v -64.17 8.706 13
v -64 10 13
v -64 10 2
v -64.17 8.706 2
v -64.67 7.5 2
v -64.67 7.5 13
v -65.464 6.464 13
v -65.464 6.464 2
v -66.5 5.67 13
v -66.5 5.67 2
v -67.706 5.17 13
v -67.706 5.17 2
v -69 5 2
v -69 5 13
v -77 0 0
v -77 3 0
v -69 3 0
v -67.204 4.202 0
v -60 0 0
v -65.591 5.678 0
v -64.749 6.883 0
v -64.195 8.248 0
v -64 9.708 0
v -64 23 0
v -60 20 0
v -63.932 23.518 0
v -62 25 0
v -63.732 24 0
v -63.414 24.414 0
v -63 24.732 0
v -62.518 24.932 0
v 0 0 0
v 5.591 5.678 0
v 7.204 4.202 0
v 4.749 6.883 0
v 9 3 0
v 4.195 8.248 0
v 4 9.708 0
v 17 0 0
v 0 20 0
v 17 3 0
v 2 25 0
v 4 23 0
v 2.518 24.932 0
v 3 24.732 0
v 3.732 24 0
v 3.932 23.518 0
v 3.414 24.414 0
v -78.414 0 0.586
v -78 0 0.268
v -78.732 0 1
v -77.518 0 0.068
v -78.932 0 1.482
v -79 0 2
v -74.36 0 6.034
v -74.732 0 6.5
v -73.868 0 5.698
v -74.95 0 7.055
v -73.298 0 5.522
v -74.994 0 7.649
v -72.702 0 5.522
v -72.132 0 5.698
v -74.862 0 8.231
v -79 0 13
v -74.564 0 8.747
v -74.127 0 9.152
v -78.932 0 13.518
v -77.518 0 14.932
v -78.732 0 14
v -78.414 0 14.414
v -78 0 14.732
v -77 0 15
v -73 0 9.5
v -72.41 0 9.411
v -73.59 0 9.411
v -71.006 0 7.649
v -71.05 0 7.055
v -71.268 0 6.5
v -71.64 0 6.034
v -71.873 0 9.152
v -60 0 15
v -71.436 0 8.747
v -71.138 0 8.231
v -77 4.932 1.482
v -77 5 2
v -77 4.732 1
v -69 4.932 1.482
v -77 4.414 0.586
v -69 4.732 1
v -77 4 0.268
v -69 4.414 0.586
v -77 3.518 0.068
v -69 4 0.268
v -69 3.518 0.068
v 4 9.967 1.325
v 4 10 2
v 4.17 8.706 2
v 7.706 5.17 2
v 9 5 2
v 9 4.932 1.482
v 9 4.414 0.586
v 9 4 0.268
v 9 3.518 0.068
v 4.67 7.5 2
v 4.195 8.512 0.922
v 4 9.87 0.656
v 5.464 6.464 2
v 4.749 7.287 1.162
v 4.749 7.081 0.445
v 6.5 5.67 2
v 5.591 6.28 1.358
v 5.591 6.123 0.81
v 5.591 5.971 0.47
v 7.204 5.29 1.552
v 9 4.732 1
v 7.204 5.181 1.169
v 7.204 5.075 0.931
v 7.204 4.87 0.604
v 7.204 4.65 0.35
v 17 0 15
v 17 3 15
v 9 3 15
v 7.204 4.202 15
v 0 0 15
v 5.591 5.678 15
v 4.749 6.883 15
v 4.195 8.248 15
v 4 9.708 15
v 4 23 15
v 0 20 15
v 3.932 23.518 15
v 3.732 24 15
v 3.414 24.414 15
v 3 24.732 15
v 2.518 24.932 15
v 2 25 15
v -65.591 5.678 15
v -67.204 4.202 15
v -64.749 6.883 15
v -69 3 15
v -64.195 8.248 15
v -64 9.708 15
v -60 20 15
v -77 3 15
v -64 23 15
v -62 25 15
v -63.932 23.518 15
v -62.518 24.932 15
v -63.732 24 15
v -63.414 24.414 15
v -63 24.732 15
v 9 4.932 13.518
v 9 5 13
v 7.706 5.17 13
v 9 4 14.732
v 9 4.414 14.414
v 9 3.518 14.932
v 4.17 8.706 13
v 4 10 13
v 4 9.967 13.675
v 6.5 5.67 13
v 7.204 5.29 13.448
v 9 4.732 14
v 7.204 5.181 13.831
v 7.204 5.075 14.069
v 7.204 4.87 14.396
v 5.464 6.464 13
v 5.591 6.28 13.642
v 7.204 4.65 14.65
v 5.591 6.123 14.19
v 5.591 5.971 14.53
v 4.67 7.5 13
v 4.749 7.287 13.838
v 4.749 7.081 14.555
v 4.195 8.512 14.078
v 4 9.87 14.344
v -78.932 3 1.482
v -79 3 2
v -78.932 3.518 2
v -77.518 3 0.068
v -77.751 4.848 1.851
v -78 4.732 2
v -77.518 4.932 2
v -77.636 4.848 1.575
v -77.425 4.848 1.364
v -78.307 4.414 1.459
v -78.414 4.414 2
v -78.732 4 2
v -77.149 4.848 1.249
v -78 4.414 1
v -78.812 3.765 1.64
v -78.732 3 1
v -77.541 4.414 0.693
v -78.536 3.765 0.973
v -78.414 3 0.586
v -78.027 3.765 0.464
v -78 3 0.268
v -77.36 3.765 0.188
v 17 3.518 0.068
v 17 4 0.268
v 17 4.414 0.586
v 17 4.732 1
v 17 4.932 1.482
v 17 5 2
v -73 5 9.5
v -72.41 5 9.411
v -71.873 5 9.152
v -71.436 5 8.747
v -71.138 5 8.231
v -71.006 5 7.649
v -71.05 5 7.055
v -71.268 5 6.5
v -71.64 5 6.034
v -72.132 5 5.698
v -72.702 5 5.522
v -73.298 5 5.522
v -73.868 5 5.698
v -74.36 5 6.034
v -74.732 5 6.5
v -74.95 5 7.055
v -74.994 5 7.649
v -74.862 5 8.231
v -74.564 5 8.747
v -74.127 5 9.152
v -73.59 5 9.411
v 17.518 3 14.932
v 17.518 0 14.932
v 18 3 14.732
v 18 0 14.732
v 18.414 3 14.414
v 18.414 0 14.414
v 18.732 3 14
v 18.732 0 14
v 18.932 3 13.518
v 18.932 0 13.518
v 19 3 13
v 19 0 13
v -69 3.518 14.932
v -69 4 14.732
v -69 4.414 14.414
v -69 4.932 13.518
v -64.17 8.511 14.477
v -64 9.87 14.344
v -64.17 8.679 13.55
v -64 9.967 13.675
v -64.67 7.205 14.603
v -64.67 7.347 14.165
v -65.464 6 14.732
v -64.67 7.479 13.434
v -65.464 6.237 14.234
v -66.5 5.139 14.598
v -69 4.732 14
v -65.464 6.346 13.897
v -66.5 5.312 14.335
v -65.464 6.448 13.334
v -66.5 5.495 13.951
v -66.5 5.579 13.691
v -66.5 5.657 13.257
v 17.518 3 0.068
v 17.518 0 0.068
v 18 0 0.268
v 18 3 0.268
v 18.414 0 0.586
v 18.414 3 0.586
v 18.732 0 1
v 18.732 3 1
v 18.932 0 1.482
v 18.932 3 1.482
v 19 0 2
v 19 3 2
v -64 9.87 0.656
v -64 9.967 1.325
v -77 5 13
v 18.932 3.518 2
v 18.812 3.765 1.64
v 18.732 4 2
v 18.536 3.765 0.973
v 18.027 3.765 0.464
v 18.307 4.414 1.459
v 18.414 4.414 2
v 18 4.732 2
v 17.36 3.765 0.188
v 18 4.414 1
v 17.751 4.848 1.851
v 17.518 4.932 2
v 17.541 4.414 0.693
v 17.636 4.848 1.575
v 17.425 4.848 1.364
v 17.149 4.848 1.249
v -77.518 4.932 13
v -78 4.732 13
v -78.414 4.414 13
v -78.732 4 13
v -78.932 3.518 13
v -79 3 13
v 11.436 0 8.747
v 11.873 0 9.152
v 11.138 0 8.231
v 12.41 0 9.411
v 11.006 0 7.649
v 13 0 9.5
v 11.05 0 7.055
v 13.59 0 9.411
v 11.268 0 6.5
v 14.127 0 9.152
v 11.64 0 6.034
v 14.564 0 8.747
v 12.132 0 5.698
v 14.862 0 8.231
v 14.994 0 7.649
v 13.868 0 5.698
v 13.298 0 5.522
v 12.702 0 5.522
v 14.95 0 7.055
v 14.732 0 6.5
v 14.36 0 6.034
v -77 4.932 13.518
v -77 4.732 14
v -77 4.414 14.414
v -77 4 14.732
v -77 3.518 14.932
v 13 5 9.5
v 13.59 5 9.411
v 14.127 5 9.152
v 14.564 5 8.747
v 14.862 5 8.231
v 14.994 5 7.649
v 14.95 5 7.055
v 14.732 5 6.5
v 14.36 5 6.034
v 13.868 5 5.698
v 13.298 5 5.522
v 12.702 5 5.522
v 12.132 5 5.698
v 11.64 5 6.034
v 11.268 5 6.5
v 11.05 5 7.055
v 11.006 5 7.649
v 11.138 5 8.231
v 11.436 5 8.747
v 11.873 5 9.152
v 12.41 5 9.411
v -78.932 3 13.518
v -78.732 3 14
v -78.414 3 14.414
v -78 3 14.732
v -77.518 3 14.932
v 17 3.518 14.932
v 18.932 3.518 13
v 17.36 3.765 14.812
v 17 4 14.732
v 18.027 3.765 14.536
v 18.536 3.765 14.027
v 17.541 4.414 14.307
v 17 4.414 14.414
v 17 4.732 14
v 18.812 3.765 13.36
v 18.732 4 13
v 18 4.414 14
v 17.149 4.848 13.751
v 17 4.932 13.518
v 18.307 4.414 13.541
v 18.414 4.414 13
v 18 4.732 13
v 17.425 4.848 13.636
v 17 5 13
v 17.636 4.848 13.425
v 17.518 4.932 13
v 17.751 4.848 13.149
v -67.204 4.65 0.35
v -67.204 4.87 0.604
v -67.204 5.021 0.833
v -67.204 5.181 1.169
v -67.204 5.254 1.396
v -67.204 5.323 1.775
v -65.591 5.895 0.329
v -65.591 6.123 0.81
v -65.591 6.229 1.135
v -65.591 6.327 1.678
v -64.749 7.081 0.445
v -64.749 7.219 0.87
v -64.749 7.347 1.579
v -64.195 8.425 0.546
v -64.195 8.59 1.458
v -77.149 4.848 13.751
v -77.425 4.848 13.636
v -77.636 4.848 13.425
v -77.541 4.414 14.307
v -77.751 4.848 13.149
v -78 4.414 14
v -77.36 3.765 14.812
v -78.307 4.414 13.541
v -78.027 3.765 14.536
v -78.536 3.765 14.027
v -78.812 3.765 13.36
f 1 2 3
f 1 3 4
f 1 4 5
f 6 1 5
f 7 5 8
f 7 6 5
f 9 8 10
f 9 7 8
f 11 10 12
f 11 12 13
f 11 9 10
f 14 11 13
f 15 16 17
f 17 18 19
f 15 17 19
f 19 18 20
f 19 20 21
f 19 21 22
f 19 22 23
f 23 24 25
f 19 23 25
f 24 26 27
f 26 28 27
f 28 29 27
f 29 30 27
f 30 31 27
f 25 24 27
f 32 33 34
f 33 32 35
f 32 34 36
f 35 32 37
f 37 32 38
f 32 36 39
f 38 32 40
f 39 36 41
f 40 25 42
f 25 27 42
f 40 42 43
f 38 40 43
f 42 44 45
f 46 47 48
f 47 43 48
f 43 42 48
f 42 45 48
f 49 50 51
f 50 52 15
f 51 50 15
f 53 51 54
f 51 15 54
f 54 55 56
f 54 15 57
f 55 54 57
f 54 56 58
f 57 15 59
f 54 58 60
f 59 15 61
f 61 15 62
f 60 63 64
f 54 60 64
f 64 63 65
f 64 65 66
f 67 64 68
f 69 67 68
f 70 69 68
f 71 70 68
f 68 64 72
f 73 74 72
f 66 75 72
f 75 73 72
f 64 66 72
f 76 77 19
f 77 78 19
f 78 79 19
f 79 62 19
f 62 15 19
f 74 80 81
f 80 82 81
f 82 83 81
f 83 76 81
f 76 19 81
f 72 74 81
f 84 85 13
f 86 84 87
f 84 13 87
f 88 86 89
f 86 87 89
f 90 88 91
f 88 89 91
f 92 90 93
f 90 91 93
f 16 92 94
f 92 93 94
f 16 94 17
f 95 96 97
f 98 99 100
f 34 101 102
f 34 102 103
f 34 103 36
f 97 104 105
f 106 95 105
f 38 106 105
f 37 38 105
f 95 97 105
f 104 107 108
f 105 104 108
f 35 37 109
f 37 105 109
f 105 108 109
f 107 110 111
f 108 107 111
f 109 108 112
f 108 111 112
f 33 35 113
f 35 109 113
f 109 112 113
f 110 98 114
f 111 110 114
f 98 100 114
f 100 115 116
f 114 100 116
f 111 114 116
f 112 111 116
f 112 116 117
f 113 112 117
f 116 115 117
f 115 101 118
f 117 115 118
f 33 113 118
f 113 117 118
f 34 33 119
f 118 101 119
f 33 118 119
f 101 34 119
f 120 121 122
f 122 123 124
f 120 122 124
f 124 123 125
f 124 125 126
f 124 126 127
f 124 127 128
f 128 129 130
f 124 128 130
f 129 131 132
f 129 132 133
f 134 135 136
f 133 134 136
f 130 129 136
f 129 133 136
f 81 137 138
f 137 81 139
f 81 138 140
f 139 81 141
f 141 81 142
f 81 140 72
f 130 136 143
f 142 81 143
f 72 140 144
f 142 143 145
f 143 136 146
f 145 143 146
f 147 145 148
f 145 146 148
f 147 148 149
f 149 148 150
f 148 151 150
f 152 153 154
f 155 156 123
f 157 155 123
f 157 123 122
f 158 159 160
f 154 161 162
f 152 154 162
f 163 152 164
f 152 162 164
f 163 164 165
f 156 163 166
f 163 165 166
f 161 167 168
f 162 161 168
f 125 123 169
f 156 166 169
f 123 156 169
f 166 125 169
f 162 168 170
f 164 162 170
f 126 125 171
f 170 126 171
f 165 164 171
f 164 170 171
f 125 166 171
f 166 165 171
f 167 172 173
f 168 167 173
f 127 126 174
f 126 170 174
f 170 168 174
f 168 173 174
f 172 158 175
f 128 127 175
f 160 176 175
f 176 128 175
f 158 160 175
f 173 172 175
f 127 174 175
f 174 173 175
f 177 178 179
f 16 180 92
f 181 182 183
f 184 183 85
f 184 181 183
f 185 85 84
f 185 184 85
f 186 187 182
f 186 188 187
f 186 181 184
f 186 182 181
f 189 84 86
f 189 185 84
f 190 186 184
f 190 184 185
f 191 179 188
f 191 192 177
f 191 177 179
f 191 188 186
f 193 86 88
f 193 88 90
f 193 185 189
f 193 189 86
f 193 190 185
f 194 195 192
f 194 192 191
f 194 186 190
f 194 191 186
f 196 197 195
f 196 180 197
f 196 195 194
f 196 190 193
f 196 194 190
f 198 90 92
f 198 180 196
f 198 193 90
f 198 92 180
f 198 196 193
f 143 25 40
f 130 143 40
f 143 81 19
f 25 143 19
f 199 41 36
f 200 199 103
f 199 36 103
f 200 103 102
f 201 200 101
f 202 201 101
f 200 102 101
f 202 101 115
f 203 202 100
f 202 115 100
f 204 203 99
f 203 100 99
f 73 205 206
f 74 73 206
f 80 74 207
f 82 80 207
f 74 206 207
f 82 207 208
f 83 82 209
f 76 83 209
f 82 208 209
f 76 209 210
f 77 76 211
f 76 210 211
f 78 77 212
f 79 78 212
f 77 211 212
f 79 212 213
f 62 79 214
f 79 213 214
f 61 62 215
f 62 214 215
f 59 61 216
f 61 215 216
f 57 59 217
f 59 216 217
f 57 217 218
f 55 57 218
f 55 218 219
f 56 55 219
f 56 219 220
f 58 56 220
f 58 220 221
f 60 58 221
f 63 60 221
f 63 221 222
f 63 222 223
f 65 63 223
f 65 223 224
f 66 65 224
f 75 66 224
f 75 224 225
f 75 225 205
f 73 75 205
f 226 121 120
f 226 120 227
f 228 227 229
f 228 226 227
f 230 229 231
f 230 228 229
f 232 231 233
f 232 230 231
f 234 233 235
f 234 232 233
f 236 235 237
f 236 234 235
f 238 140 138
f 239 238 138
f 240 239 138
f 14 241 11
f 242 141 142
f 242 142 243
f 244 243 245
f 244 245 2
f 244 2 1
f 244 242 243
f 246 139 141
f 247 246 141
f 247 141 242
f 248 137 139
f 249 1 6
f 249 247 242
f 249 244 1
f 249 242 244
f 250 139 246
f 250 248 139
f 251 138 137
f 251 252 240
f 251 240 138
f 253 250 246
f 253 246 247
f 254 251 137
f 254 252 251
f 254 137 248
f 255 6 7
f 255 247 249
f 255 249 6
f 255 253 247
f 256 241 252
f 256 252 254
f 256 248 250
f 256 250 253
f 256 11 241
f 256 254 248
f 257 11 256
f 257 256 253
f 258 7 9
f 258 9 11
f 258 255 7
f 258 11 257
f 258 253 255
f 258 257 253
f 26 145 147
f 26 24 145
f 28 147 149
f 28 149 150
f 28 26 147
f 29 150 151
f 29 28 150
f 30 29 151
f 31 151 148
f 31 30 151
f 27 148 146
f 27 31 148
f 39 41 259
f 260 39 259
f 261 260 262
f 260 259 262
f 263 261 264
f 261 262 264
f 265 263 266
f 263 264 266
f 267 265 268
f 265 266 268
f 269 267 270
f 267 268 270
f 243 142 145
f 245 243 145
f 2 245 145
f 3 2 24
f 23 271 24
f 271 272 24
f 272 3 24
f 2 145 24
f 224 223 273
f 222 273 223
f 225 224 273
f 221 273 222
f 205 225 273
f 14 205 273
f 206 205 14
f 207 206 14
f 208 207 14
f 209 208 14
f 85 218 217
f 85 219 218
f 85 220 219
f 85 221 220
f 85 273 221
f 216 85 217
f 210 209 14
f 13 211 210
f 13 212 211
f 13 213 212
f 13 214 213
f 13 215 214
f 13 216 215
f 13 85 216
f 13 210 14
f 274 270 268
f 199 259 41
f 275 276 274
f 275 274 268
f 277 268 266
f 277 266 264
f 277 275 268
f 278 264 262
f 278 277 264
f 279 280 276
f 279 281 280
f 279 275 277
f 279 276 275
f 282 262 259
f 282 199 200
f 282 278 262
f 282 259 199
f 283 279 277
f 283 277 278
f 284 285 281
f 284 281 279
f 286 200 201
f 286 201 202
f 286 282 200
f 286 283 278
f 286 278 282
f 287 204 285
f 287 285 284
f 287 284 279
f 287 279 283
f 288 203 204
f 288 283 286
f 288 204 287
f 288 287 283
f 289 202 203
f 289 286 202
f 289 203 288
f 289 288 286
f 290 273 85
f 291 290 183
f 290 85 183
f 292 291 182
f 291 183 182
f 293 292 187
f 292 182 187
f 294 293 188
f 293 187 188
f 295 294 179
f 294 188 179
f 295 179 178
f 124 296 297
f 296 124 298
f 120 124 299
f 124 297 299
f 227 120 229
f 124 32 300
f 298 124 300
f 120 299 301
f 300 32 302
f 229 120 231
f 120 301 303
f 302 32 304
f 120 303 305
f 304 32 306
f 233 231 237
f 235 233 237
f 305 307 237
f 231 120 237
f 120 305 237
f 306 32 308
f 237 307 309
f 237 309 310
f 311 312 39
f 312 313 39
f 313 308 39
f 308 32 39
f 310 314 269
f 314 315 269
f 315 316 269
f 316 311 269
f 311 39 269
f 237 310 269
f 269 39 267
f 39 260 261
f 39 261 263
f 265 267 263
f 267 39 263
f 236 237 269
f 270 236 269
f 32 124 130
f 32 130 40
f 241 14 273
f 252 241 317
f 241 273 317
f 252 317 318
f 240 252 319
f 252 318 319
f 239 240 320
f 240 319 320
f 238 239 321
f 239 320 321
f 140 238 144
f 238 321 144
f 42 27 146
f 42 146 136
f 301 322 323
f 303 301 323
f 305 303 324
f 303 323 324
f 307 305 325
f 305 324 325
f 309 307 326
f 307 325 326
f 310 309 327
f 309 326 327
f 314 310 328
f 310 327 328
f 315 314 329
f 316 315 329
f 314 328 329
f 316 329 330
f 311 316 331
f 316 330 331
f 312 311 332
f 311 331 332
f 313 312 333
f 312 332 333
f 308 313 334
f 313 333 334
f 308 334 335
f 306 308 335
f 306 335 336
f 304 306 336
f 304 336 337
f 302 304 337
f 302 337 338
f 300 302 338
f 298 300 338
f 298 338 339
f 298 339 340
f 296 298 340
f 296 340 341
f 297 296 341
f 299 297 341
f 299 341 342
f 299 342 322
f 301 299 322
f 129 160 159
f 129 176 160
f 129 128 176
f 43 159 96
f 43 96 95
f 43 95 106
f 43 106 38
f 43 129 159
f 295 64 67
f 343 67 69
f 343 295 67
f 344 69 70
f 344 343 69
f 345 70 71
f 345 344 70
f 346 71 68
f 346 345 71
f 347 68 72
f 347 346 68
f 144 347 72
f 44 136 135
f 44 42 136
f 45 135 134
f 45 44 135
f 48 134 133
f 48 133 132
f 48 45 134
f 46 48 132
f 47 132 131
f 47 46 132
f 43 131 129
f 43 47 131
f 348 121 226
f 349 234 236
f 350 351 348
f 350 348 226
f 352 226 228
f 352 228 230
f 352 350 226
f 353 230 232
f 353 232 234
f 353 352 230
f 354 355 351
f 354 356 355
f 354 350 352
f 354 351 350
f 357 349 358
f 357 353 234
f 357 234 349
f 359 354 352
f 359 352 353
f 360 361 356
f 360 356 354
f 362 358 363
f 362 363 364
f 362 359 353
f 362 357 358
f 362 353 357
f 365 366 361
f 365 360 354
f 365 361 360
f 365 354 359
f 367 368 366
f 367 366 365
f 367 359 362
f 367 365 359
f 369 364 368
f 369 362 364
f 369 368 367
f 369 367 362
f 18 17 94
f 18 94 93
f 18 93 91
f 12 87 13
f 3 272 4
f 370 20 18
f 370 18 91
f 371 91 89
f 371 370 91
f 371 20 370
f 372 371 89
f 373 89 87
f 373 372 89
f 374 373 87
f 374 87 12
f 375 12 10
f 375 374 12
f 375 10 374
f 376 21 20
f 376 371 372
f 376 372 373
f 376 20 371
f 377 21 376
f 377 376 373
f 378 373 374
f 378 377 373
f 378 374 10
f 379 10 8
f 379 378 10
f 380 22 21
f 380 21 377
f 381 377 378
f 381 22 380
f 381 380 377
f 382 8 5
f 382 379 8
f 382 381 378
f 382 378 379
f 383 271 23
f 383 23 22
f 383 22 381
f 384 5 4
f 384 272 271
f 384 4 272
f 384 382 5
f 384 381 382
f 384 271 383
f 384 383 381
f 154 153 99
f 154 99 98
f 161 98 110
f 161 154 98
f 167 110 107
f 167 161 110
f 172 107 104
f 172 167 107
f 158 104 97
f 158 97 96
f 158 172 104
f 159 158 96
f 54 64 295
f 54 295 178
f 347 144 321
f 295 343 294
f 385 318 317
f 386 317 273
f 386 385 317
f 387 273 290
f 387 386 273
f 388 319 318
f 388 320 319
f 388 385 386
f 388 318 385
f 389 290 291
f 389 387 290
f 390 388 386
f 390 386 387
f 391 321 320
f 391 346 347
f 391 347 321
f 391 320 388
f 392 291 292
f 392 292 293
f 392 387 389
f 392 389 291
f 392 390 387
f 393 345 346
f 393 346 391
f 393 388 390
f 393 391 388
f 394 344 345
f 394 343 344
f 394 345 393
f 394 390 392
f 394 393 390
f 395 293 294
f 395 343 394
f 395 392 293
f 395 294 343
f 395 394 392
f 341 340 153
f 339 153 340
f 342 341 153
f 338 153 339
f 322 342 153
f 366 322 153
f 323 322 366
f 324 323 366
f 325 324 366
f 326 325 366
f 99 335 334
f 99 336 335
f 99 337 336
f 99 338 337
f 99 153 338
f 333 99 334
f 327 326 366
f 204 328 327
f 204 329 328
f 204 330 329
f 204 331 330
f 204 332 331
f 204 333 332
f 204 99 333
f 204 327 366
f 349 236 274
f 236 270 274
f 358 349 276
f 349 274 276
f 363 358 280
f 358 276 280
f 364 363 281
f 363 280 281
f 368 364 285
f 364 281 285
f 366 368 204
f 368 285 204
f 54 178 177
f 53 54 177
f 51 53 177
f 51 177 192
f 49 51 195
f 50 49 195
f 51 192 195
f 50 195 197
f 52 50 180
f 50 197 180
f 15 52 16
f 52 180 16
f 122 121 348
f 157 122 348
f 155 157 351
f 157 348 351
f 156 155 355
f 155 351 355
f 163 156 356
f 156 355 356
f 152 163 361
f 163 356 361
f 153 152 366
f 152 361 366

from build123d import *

# Parameters (mm, degrees)
SKETCH1_W           = 15
SKETCH1_H           = 15
SKETCH1_W_2         = 4
SKETCH1_W_3         = 60
BOSS_EXTRUDE1_DEPTH = 25
SKETCH1_3_W         = 60
SKETCH1_3_H         = 15
CUT_EXTRUDE1_DEPTH  = 20
CUT_EXTRUDE2_START  = 25
SKETCH1_4_W         = 15
SKETCH1_4_H         = 15
CUT_EXTRUDE2_DEPTH  = 20
FILLET1_R           = 2
FILLET2_R           = 2
FILLET3_R           = 5
CUT_EXTRUDE3_REACH  = 84.861
SKETCH2_R           = 2


with BuildPart() as part:
    # Sketch1 → Boss-Extrude1 (new body)
    with BuildSketch(Plane(origin=(0, 0, 0), x_dir=(1, 0, 0), z_dir=(0, 1, 0))):
        with Locations((-71.5, -7.5)):
            Rectangle(SKETCH1_W, SKETCH1_H)
        with Locations((-62, -7.5)):
            Rectangle(SKETCH1_W_2, SKETCH1_H)
        with Locations((-30, -7.5)):
            Rectangle(SKETCH1_W_3, SKETCH1_H)
        with Locations((2, -7.5)):
            Rectangle(SKETCH1_W_2, SKETCH1_H)
        with Locations((11.5, -7.5)):
            Rectangle(SKETCH1_W, SKETCH1_H)
    extrude(amount=BOSS_EXTRUDE1_DEPTH)

    # Sketch1<3> → Cut-Extrude1 (cut)
    with BuildSketch(Plane(origin=(0, 0, 0), x_dir=(1, 0, 0), z_dir=(0, 1, 0))):
        with Locations((-30, -7.5)):
            Rectangle(SKETCH1_3_W, SKETCH1_3_H)
    extrude(amount=CUT_EXTRUDE1_DEPTH, mode=Mode.SUBTRACT)

    # Sketch1<4> → Cut-Extrude2 (cut)
    with BuildSketch(Plane(origin=(0, 0, 0), x_dir=(1, 0, 0), z_dir=(0, 1, 0)).offset(CUT_EXTRUDE2_START)):
        with Locations((-71.5, -7.5)):
            Rectangle(SKETCH1_4_W, SKETCH1_4_H)
        with Locations((11.5, -7.5)):
            Rectangle(SKETCH1_4_W, SKETCH1_4_H)
    extrude(amount=-CUT_EXTRUDE2_DEPTH, mode=Mode.SUBTRACT)

    # Fillet1
    fillet1_edges = [part.edges().sort_by_distance(p)[0] for p in [
        (19, 2.5, 0),
        (19, 2.5, 15),
        (-79, 2.5, 15),
        (-79, 2.5, 0),
        (-64, 25, 7.5),
        (4, 25, 7.5),
    ]]
    fillet(fillet1_edges, radius=FILLET1_R)

    # Fillet2
    fillet2_edges = [part.edges().sort_by_distance(p)[0] for p in [
        (-70.5, 5, 0),
        (-70.5, 5, 15),
        (10.5, 5, 15),
        (10.5, 5, 0),
        (19, 5, 7.5),
        (18.414213562, 5, 14.414213562),
        (18.414213562, 5, 0.585786438),
        (-79, 5, 7.5),
        (-78.414213562, 5, 14.414213562),
        (-78.414213562, 5, 0.585786438),
    ]]
    fillet(fillet2_edges, radius=FILLET2_R)

    # Fillet3
    # the kernel refuses this fillet: 5 mm, written as the material it adds along each edge
    with BuildSketch(Plane(origin=(-64, 5, 13), x_dir=(-1, 0, 0), z_dir=(0, 0, -1))) as fillet3_piece_1:
        with BuildLine():
            CenterArc((FILLET3_R, FILLET3_R), FILLET3_R, 180, 90)
            Line((0, FILLET3_R), (0, 0))
            Line((0, 0), (FILLET3_R, 0))
        make_face()
    extrude(amount=11)
    with BuildSketch(Plane(origin=(4, 5, 13), x_dir=(1, 0, 0), z_dir=(0, 0, -1))) as fillet3_piece_2:
        with BuildLine():
            CenterArc((FILLET3_R, -FILLET3_R), FILLET3_R, 90, 90)
            Line((0, -FILLET3_R), (0, 0))
            Line((0, 0), (FILLET3_R, 0))
        make_face()
    extrude(amount=11)
    with BuildSketch(Plane(origin=(-64, 3, 13), x_dir=(0, 0.9999802608561372, -0.00628314396555929), z_dir=(0, 0.00628314396555929, 0.9999802608561372))) as fillet3_piece_3_section:
        with BuildLine():
            CenterArc((-2 - FILLET3_R, FILLET3_R), FILLET3_R, 270, 90)
            Line((-2 - FILLET3_R, 0), (-2, 0))
            Line((-2, 0), (-2, FILLET3_R))
        make_face()
    fillet3_piece_3 = revolve(axis=Axis((-64, 3, 13), (-1, 0, 0)), revolution_arc=359.64, mode=Mode.PRIVATE)
    fillet3_piece_3 = split(fillet3_piece_3, bisect_by=Plane(origin=(-65.84257052, 4.524977571, 15), z_dir=(0, 0, -1)), keep=Keep.TOP, mode=Mode.PRIVATE)
    fillet3_piece_3 = split(fillet3_piece_3, bisect_by=Plane(origin=(-65.84257052, 0, 14.524977571), z_dir=(0, 1, 0)), keep=Keep.TOP, mode=Mode.PRIVATE)
    add(fillet3_piece_3)
    with BuildSketch(Plane(origin=(4, 3, 13), x_dir=(0, 1, 0), z_dir=(0, 0, -1))) as fillet3_piece_4_section:
        with BuildLine():
            CenterArc((2 + FILLET3_R, FILLET3_R), FILLET3_R, 180, 90)
            Line((2 + FILLET3_R, 0), (2, 0))
            Line((2, 0), (2, FILLET3_R))
        make_face()
    fillet3_piece_4 = revolve(axis=Axis((4, 3, 13), (1, 0, 0)), revolution_arc=359.64, mode=Mode.PRIVATE)
    fillet3_piece_4 = split(fillet3_piece_4, bisect_by=Plane(origin=(5.842570594, 4.524977559, 15), z_dir=(0, 0, -1)), keep=Keep.TOP, mode=Mode.PRIVATE)
    fillet3_piece_4 = split(fillet3_piece_4, bisect_by=Plane(origin=(5.842570594, 0, 14.524977563), z_dir=(0, 1, 0)), keep=Keep.TOP, mode=Mode.PRIVATE)
    add(fillet3_piece_4)
    with BuildSketch(Plane(origin=(-64, 3, 2), x_dir=(0, 0.9999802608561372, 0.006283143965558735), z_dir=(0, 0.006283143965558735, -0.9999802608561372))) as fillet3_piece_5_section:
        with BuildLine():
            CenterArc((-2 - FILLET3_R, -FILLET3_R), FILLET3_R, 0, 90)
            Line((-2 - FILLET3_R, 0), (-2, 0))
            Line((-2, 0), (-2, -FILLET3_R))
        make_face()
    fillet3_piece_5 = revolve(axis=Axis((-64, 3, 2), (1, 0, 0)), revolution_arc=359.64, mode=Mode.PRIVATE)
    fillet3_piece_5 = split(fillet3_piece_5, bisect_by=Plane(origin=(-65.842570484, 4.524977652, 0), z_dir=(0, 0, 1)), keep=Keep.TOP, mode=Mode.PRIVATE)
    fillet3_piece_5 = split(fillet3_piece_5, bisect_by=Plane(origin=(-65.842570484, 0, 0.47502245), z_dir=(0, 1, 0)), keep=Keep.TOP, mode=Mode.PRIVATE)
    add(fillet3_piece_5)
    with BuildSketch(Plane(origin=(4, 3, 2), x_dir=(0, 1, 0), z_dir=(0, 0, 1))) as fillet3_piece_6_section:
        with BuildLine():
            CenterArc((2 + FILLET3_R, -FILLET3_R), FILLET3_R, 90, 90)
            Line((2, -FILLET3_R), (2, 0))
            Line((2, 0), (2 + FILLET3_R, 0))
        make_face()
    fillet3_piece_6 = revolve(axis=Axis((4, 3, 2), (-1, 0, 0)), revolution_arc=359.64, mode=Mode.PRIVATE)
    fillet3_piece_6 = split(fillet3_piece_6, bisect_by=Plane(origin=(4.944030812, 6.137069115, 0), z_dir=(0, 0, 1)), keep=Keep.TOP, mode=Mode.PRIVATE)
    fillet3_piece_6 = split(fillet3_piece_6, bisect_by=Plane(origin=(4.944030812, 0, 1.077199574), z_dir=(0, 1, 0)), keep=Keep.TOP, mode=Mode.PRIVATE)
    add(fillet3_piece_6)

    # Sketch2 → Cut-Extrude3 (cut, up to next)
    with BuildSketch(Plane(origin=(0, 5, 0), x_dir=(1, 0, 0), z_dir=(0, 1, 0)), mode=Mode.PRIVATE) as cut_extrude3_sk1:
        with Locations(Location((13, -7.5, 0), (0, 0, 270))):
            Circle(SKETCH2_R)
    cut_extrude3_tool1 = extrude(cut_extrude3_sk1.sketch, amount=-CUT_EXTRUDE3_REACH, mode=Mode.PRIVATE) & part.part
    # Sketch2 → Cut-Extrude3 (cut, up to next)
    with BuildSketch(Plane(origin=(0, 5, 0), x_dir=(1, 0, 0), z_dir=(0, 1, 0)), mode=Mode.PRIVATE) as cut_extrude3_sk2:
        with Locations(Location((-73, -7.5, 0), (0, 0, 270))):
            Circle(SKETCH2_R)
    cut_extrude3_tool2 = extrude(cut_extrude3_sk2.sketch, amount=-CUT_EXTRUDE3_REACH, mode=Mode.PRIVATE) & part.part
    add(cut_extrude3_tool1.solids().sort_by_distance((13, 5, 7.5))[0], mode=Mode.SUBTRACT)
    add(cut_extrude3_tool2.solids().sort_by_distance((-73, 5, 7.5))[0], mode=Mode.SUBTRACT)


solid = part.part
